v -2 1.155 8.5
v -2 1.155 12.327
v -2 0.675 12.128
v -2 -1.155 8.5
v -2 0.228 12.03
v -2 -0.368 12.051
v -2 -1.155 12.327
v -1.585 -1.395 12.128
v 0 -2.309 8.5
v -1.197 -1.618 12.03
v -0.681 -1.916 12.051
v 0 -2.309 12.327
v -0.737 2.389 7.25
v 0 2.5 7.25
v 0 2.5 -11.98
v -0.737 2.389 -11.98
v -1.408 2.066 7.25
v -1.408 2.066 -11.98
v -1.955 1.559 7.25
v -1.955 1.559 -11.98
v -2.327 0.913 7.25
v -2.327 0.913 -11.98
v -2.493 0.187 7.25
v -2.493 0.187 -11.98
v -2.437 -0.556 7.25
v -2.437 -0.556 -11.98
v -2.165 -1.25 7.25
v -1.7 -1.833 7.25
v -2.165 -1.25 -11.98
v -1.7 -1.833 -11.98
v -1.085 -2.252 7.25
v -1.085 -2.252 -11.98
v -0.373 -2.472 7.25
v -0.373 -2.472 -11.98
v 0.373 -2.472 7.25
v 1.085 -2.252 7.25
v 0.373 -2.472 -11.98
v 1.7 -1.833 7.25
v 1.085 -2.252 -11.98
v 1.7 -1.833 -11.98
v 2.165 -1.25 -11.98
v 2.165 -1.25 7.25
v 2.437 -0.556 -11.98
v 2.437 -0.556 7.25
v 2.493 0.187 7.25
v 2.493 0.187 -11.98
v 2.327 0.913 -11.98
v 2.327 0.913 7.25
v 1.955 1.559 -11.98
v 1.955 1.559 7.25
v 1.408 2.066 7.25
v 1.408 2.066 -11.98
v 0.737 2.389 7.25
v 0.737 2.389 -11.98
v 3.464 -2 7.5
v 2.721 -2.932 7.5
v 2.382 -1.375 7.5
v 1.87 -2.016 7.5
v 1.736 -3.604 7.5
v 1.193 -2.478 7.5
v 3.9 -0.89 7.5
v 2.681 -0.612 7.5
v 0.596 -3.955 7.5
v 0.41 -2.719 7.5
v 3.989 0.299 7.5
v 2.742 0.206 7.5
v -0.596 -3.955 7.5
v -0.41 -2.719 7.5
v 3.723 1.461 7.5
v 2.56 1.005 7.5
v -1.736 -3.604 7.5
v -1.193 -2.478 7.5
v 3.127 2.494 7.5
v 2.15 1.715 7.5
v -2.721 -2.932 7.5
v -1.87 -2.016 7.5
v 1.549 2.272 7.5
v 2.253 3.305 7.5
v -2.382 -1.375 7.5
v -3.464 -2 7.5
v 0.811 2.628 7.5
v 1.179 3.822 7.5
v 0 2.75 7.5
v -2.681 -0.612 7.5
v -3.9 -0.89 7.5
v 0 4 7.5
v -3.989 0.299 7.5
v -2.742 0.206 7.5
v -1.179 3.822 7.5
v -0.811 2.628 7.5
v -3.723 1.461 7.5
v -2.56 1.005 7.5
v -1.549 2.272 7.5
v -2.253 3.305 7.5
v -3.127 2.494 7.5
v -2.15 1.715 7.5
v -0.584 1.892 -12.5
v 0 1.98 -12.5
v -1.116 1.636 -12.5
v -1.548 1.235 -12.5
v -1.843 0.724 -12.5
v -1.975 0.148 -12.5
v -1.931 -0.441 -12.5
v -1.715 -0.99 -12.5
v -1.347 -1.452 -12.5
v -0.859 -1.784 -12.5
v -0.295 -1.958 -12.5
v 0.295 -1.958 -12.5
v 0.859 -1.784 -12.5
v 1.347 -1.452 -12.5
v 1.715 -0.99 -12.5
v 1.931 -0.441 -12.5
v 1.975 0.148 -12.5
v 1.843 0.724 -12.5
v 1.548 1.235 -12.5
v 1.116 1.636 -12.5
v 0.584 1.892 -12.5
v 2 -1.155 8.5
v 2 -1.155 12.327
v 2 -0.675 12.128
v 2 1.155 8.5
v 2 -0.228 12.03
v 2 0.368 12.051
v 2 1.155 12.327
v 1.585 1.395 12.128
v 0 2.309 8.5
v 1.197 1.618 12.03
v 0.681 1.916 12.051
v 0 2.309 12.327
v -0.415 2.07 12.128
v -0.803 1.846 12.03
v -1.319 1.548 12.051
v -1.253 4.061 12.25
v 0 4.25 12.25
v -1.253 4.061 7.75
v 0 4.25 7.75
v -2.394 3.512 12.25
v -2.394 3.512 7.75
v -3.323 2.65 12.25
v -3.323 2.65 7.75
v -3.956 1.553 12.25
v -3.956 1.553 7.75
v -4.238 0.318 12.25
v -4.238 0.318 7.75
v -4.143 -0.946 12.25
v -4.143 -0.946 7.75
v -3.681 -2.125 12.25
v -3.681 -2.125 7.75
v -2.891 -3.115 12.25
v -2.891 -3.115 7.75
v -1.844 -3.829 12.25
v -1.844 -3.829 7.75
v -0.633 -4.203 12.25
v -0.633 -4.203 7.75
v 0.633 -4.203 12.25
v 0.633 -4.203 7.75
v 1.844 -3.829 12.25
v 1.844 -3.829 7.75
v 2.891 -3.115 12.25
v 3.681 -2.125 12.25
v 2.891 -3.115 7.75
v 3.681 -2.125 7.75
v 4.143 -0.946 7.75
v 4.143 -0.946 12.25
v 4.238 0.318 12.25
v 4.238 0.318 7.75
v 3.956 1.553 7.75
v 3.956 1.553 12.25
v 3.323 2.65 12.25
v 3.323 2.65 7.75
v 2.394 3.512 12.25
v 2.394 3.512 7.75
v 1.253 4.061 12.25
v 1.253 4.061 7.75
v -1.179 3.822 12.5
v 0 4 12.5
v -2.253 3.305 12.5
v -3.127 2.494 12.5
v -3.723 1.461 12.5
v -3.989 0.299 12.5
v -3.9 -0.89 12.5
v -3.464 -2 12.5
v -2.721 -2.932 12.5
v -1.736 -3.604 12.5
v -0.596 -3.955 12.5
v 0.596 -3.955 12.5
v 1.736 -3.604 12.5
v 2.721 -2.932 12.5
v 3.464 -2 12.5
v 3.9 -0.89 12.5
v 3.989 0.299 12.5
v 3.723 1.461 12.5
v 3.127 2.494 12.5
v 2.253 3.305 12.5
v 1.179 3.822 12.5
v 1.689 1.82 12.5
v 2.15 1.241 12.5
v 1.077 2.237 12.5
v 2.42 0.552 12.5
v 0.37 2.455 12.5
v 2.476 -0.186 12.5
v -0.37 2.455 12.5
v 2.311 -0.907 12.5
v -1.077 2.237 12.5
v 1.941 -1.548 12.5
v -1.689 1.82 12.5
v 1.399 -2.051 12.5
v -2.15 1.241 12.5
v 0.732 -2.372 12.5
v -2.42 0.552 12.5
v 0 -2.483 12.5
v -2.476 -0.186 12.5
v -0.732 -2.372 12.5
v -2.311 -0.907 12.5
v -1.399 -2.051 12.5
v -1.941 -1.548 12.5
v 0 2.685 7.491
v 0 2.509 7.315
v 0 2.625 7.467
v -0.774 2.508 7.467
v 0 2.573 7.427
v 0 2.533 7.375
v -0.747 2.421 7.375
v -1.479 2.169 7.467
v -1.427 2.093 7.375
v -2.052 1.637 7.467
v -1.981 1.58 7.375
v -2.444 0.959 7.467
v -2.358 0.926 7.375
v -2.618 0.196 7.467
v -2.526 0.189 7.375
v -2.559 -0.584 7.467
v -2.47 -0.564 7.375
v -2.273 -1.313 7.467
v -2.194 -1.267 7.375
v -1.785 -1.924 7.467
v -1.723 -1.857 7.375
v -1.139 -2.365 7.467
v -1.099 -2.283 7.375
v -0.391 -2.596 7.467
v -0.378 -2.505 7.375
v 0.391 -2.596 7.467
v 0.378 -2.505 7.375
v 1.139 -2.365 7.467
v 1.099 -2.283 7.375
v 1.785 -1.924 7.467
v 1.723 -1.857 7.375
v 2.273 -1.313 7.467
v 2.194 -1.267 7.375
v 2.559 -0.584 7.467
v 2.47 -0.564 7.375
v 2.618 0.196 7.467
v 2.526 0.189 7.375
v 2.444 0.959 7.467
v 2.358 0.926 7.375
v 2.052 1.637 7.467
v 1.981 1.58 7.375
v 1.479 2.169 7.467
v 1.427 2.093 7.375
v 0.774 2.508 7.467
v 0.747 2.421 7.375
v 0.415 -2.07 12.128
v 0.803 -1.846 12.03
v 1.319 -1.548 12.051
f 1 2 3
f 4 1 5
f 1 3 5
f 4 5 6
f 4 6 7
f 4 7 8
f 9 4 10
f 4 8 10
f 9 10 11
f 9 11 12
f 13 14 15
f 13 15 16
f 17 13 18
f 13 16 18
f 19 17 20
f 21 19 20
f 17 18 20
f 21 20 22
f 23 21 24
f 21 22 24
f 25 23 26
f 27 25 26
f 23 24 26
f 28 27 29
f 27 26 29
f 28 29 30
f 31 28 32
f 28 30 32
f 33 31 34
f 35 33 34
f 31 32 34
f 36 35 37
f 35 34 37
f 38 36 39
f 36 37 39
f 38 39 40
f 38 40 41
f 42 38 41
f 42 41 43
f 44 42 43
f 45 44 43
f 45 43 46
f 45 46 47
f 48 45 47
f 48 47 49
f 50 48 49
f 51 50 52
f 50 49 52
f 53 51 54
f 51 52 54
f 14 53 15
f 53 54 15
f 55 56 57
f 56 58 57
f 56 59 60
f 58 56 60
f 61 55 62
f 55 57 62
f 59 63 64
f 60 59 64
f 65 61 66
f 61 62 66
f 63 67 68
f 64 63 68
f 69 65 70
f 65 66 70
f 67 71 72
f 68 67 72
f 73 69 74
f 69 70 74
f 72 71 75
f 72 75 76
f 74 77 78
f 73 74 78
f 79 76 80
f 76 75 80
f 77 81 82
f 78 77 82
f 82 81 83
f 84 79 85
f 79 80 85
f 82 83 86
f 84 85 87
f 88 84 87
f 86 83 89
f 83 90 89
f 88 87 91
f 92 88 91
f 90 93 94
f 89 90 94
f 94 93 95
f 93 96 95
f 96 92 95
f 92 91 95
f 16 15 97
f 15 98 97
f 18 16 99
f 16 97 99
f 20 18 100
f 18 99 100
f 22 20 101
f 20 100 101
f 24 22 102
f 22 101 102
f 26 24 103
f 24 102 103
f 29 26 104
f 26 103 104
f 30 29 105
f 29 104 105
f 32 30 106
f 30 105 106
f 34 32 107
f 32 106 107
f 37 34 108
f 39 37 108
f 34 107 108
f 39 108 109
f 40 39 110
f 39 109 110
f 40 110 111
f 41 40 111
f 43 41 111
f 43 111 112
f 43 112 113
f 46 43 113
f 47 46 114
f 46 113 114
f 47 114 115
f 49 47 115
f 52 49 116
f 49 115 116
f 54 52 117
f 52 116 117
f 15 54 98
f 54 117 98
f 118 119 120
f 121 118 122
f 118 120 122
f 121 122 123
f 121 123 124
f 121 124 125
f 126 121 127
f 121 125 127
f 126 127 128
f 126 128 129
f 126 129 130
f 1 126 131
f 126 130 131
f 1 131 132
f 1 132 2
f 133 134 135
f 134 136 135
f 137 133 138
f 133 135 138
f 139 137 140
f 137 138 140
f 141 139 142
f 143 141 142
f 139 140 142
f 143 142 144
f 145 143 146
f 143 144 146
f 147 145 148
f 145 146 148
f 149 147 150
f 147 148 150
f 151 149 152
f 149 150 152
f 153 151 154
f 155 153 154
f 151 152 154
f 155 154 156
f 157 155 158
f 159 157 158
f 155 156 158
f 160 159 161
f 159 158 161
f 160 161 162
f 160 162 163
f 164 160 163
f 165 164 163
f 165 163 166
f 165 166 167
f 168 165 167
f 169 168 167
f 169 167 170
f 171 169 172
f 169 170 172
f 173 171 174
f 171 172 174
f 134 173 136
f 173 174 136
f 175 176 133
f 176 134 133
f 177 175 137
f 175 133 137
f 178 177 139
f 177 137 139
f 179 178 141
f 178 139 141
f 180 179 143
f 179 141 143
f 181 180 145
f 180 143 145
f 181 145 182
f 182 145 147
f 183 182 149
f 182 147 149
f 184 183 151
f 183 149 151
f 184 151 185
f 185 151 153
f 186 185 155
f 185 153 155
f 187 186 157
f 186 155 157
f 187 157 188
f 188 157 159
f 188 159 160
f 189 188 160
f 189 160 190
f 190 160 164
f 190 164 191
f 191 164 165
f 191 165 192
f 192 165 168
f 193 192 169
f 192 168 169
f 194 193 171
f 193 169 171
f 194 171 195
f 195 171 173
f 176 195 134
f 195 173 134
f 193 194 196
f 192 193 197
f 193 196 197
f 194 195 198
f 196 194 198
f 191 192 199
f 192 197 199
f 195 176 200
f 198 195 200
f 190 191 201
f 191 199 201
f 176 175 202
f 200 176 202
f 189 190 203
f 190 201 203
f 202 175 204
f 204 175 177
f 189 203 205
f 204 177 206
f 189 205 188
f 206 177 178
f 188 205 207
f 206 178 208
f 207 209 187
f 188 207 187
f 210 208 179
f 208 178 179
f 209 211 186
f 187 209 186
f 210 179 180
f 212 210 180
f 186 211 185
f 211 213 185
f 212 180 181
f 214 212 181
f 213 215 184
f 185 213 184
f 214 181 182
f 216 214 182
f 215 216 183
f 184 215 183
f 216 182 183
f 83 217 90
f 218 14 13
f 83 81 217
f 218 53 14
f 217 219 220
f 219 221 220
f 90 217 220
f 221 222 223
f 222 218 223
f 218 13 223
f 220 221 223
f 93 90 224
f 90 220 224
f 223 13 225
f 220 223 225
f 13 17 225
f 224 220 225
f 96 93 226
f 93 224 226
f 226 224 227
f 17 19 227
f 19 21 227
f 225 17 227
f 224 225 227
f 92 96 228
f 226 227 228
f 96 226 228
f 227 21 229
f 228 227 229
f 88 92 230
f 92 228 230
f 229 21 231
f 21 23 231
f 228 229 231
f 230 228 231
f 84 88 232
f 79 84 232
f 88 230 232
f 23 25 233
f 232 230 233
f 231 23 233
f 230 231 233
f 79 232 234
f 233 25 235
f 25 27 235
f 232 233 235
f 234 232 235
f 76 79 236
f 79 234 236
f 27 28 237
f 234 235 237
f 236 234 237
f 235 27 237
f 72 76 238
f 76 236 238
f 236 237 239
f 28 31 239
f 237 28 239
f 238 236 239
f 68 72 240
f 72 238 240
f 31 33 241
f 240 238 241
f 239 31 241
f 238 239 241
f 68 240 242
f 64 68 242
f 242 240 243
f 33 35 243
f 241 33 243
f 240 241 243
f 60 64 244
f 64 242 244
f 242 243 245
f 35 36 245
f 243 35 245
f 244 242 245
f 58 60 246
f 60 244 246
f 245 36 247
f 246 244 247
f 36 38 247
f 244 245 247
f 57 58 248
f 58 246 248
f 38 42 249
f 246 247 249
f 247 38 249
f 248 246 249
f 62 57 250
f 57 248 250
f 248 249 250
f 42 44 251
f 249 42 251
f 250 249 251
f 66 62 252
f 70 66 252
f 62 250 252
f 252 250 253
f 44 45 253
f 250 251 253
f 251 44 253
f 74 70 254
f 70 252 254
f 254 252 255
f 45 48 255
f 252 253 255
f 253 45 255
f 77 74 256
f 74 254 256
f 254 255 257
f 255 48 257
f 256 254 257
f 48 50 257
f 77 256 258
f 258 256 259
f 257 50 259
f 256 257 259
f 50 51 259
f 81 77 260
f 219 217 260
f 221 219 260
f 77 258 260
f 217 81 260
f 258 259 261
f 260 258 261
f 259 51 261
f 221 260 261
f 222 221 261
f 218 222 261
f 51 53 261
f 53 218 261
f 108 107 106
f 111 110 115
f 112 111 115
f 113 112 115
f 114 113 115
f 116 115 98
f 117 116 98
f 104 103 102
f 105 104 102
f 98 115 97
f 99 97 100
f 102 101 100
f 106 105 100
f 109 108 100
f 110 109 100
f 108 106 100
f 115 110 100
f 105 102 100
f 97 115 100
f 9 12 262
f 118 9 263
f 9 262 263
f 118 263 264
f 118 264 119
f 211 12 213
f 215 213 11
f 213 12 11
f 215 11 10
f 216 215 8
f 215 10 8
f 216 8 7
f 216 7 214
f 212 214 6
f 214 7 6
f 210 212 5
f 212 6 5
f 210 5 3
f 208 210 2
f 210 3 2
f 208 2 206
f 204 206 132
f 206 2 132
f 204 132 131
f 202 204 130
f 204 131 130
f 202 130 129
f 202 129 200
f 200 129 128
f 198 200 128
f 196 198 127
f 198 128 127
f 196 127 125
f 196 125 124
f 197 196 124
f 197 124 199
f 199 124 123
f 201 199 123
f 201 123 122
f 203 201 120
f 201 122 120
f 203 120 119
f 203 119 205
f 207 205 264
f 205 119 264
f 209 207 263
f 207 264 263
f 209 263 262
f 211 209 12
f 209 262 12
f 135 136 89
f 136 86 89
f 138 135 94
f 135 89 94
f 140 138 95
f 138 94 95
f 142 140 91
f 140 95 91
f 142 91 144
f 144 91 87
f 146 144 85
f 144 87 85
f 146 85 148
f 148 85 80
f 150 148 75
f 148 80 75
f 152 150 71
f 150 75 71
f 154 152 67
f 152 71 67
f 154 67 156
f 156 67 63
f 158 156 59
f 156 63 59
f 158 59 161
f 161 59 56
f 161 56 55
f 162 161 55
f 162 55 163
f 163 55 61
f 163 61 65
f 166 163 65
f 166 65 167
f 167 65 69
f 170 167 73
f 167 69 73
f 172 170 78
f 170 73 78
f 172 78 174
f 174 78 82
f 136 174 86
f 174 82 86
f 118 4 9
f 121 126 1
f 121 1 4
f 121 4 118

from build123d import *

# Parameters (mm, degrees)
CUT_EXTRUDE1_DEPTH = 4


with BuildPart() as part:
    # Sketch2 → Revolve1 (revolve)
    with BuildSketch(Plane(origin=(0, 0, 0), x_dir=(0, 0, -1), z_dir=(1, 0, 0))):
        with BuildLine():
            Line((-12.5, 0), (-12.5, 4))
            Line((-12.5, 4), (-12.25, 4.25))
            Line((-12.25, 4.25), (-7.75, 4.25))
            Line((-7.75, 4.25), (-7.5, 4))
            Line((-7.5, 4), (-7.5, 2.75))
            ThreePointArc((-7.5, 2.75), (-7.426776695, 2.573223305), (-7.25, 2.5))
            Line((-7.25, 2.5), (11.980384758, 2.5))
            Line((11.980384758, 2.5), (12.5, 1.980384758))
            Line((12.5, 1.980384758), (12.5, 0))
            Line((12.5, 0), (-12.5, 0))
        make_face()
    revolve(axis=Axis((0, 0, -12.5), (0, 0, 1)))

    # Sketch3 → Cut-Extrude1 (cut)
    with BuildSketch(Plane.XY.offset(12.5)):
        Polygon((2, -1.154700538), (2, 1.154700538), (0, 2.309401077), (-2, 1.154700538), (-2, -1.154700538), (0, -2.309401077), align=None)
    extrude(amount=-CUT_EXTRUDE1_DEPTH, mode=Mode.SUBTRACT)

    # Cut-Extrude2 cone 1 section (through the dimple's axis) → Cut-Extrude2 (revolve, cut)
    with BuildSketch(Plane(origin=(0, 0, 12.5), x_dir=(0, -1, 0), z_dir=(1, 0, 0))):
        Polygon((0, 0), (2.482606158, 0), (0, 2.482606158), align=None)
    revolve(axis=Axis((0, 0, 12.5), (0, 0, -1)), mode=Mode.SUBTRACT)


solid = part.part
